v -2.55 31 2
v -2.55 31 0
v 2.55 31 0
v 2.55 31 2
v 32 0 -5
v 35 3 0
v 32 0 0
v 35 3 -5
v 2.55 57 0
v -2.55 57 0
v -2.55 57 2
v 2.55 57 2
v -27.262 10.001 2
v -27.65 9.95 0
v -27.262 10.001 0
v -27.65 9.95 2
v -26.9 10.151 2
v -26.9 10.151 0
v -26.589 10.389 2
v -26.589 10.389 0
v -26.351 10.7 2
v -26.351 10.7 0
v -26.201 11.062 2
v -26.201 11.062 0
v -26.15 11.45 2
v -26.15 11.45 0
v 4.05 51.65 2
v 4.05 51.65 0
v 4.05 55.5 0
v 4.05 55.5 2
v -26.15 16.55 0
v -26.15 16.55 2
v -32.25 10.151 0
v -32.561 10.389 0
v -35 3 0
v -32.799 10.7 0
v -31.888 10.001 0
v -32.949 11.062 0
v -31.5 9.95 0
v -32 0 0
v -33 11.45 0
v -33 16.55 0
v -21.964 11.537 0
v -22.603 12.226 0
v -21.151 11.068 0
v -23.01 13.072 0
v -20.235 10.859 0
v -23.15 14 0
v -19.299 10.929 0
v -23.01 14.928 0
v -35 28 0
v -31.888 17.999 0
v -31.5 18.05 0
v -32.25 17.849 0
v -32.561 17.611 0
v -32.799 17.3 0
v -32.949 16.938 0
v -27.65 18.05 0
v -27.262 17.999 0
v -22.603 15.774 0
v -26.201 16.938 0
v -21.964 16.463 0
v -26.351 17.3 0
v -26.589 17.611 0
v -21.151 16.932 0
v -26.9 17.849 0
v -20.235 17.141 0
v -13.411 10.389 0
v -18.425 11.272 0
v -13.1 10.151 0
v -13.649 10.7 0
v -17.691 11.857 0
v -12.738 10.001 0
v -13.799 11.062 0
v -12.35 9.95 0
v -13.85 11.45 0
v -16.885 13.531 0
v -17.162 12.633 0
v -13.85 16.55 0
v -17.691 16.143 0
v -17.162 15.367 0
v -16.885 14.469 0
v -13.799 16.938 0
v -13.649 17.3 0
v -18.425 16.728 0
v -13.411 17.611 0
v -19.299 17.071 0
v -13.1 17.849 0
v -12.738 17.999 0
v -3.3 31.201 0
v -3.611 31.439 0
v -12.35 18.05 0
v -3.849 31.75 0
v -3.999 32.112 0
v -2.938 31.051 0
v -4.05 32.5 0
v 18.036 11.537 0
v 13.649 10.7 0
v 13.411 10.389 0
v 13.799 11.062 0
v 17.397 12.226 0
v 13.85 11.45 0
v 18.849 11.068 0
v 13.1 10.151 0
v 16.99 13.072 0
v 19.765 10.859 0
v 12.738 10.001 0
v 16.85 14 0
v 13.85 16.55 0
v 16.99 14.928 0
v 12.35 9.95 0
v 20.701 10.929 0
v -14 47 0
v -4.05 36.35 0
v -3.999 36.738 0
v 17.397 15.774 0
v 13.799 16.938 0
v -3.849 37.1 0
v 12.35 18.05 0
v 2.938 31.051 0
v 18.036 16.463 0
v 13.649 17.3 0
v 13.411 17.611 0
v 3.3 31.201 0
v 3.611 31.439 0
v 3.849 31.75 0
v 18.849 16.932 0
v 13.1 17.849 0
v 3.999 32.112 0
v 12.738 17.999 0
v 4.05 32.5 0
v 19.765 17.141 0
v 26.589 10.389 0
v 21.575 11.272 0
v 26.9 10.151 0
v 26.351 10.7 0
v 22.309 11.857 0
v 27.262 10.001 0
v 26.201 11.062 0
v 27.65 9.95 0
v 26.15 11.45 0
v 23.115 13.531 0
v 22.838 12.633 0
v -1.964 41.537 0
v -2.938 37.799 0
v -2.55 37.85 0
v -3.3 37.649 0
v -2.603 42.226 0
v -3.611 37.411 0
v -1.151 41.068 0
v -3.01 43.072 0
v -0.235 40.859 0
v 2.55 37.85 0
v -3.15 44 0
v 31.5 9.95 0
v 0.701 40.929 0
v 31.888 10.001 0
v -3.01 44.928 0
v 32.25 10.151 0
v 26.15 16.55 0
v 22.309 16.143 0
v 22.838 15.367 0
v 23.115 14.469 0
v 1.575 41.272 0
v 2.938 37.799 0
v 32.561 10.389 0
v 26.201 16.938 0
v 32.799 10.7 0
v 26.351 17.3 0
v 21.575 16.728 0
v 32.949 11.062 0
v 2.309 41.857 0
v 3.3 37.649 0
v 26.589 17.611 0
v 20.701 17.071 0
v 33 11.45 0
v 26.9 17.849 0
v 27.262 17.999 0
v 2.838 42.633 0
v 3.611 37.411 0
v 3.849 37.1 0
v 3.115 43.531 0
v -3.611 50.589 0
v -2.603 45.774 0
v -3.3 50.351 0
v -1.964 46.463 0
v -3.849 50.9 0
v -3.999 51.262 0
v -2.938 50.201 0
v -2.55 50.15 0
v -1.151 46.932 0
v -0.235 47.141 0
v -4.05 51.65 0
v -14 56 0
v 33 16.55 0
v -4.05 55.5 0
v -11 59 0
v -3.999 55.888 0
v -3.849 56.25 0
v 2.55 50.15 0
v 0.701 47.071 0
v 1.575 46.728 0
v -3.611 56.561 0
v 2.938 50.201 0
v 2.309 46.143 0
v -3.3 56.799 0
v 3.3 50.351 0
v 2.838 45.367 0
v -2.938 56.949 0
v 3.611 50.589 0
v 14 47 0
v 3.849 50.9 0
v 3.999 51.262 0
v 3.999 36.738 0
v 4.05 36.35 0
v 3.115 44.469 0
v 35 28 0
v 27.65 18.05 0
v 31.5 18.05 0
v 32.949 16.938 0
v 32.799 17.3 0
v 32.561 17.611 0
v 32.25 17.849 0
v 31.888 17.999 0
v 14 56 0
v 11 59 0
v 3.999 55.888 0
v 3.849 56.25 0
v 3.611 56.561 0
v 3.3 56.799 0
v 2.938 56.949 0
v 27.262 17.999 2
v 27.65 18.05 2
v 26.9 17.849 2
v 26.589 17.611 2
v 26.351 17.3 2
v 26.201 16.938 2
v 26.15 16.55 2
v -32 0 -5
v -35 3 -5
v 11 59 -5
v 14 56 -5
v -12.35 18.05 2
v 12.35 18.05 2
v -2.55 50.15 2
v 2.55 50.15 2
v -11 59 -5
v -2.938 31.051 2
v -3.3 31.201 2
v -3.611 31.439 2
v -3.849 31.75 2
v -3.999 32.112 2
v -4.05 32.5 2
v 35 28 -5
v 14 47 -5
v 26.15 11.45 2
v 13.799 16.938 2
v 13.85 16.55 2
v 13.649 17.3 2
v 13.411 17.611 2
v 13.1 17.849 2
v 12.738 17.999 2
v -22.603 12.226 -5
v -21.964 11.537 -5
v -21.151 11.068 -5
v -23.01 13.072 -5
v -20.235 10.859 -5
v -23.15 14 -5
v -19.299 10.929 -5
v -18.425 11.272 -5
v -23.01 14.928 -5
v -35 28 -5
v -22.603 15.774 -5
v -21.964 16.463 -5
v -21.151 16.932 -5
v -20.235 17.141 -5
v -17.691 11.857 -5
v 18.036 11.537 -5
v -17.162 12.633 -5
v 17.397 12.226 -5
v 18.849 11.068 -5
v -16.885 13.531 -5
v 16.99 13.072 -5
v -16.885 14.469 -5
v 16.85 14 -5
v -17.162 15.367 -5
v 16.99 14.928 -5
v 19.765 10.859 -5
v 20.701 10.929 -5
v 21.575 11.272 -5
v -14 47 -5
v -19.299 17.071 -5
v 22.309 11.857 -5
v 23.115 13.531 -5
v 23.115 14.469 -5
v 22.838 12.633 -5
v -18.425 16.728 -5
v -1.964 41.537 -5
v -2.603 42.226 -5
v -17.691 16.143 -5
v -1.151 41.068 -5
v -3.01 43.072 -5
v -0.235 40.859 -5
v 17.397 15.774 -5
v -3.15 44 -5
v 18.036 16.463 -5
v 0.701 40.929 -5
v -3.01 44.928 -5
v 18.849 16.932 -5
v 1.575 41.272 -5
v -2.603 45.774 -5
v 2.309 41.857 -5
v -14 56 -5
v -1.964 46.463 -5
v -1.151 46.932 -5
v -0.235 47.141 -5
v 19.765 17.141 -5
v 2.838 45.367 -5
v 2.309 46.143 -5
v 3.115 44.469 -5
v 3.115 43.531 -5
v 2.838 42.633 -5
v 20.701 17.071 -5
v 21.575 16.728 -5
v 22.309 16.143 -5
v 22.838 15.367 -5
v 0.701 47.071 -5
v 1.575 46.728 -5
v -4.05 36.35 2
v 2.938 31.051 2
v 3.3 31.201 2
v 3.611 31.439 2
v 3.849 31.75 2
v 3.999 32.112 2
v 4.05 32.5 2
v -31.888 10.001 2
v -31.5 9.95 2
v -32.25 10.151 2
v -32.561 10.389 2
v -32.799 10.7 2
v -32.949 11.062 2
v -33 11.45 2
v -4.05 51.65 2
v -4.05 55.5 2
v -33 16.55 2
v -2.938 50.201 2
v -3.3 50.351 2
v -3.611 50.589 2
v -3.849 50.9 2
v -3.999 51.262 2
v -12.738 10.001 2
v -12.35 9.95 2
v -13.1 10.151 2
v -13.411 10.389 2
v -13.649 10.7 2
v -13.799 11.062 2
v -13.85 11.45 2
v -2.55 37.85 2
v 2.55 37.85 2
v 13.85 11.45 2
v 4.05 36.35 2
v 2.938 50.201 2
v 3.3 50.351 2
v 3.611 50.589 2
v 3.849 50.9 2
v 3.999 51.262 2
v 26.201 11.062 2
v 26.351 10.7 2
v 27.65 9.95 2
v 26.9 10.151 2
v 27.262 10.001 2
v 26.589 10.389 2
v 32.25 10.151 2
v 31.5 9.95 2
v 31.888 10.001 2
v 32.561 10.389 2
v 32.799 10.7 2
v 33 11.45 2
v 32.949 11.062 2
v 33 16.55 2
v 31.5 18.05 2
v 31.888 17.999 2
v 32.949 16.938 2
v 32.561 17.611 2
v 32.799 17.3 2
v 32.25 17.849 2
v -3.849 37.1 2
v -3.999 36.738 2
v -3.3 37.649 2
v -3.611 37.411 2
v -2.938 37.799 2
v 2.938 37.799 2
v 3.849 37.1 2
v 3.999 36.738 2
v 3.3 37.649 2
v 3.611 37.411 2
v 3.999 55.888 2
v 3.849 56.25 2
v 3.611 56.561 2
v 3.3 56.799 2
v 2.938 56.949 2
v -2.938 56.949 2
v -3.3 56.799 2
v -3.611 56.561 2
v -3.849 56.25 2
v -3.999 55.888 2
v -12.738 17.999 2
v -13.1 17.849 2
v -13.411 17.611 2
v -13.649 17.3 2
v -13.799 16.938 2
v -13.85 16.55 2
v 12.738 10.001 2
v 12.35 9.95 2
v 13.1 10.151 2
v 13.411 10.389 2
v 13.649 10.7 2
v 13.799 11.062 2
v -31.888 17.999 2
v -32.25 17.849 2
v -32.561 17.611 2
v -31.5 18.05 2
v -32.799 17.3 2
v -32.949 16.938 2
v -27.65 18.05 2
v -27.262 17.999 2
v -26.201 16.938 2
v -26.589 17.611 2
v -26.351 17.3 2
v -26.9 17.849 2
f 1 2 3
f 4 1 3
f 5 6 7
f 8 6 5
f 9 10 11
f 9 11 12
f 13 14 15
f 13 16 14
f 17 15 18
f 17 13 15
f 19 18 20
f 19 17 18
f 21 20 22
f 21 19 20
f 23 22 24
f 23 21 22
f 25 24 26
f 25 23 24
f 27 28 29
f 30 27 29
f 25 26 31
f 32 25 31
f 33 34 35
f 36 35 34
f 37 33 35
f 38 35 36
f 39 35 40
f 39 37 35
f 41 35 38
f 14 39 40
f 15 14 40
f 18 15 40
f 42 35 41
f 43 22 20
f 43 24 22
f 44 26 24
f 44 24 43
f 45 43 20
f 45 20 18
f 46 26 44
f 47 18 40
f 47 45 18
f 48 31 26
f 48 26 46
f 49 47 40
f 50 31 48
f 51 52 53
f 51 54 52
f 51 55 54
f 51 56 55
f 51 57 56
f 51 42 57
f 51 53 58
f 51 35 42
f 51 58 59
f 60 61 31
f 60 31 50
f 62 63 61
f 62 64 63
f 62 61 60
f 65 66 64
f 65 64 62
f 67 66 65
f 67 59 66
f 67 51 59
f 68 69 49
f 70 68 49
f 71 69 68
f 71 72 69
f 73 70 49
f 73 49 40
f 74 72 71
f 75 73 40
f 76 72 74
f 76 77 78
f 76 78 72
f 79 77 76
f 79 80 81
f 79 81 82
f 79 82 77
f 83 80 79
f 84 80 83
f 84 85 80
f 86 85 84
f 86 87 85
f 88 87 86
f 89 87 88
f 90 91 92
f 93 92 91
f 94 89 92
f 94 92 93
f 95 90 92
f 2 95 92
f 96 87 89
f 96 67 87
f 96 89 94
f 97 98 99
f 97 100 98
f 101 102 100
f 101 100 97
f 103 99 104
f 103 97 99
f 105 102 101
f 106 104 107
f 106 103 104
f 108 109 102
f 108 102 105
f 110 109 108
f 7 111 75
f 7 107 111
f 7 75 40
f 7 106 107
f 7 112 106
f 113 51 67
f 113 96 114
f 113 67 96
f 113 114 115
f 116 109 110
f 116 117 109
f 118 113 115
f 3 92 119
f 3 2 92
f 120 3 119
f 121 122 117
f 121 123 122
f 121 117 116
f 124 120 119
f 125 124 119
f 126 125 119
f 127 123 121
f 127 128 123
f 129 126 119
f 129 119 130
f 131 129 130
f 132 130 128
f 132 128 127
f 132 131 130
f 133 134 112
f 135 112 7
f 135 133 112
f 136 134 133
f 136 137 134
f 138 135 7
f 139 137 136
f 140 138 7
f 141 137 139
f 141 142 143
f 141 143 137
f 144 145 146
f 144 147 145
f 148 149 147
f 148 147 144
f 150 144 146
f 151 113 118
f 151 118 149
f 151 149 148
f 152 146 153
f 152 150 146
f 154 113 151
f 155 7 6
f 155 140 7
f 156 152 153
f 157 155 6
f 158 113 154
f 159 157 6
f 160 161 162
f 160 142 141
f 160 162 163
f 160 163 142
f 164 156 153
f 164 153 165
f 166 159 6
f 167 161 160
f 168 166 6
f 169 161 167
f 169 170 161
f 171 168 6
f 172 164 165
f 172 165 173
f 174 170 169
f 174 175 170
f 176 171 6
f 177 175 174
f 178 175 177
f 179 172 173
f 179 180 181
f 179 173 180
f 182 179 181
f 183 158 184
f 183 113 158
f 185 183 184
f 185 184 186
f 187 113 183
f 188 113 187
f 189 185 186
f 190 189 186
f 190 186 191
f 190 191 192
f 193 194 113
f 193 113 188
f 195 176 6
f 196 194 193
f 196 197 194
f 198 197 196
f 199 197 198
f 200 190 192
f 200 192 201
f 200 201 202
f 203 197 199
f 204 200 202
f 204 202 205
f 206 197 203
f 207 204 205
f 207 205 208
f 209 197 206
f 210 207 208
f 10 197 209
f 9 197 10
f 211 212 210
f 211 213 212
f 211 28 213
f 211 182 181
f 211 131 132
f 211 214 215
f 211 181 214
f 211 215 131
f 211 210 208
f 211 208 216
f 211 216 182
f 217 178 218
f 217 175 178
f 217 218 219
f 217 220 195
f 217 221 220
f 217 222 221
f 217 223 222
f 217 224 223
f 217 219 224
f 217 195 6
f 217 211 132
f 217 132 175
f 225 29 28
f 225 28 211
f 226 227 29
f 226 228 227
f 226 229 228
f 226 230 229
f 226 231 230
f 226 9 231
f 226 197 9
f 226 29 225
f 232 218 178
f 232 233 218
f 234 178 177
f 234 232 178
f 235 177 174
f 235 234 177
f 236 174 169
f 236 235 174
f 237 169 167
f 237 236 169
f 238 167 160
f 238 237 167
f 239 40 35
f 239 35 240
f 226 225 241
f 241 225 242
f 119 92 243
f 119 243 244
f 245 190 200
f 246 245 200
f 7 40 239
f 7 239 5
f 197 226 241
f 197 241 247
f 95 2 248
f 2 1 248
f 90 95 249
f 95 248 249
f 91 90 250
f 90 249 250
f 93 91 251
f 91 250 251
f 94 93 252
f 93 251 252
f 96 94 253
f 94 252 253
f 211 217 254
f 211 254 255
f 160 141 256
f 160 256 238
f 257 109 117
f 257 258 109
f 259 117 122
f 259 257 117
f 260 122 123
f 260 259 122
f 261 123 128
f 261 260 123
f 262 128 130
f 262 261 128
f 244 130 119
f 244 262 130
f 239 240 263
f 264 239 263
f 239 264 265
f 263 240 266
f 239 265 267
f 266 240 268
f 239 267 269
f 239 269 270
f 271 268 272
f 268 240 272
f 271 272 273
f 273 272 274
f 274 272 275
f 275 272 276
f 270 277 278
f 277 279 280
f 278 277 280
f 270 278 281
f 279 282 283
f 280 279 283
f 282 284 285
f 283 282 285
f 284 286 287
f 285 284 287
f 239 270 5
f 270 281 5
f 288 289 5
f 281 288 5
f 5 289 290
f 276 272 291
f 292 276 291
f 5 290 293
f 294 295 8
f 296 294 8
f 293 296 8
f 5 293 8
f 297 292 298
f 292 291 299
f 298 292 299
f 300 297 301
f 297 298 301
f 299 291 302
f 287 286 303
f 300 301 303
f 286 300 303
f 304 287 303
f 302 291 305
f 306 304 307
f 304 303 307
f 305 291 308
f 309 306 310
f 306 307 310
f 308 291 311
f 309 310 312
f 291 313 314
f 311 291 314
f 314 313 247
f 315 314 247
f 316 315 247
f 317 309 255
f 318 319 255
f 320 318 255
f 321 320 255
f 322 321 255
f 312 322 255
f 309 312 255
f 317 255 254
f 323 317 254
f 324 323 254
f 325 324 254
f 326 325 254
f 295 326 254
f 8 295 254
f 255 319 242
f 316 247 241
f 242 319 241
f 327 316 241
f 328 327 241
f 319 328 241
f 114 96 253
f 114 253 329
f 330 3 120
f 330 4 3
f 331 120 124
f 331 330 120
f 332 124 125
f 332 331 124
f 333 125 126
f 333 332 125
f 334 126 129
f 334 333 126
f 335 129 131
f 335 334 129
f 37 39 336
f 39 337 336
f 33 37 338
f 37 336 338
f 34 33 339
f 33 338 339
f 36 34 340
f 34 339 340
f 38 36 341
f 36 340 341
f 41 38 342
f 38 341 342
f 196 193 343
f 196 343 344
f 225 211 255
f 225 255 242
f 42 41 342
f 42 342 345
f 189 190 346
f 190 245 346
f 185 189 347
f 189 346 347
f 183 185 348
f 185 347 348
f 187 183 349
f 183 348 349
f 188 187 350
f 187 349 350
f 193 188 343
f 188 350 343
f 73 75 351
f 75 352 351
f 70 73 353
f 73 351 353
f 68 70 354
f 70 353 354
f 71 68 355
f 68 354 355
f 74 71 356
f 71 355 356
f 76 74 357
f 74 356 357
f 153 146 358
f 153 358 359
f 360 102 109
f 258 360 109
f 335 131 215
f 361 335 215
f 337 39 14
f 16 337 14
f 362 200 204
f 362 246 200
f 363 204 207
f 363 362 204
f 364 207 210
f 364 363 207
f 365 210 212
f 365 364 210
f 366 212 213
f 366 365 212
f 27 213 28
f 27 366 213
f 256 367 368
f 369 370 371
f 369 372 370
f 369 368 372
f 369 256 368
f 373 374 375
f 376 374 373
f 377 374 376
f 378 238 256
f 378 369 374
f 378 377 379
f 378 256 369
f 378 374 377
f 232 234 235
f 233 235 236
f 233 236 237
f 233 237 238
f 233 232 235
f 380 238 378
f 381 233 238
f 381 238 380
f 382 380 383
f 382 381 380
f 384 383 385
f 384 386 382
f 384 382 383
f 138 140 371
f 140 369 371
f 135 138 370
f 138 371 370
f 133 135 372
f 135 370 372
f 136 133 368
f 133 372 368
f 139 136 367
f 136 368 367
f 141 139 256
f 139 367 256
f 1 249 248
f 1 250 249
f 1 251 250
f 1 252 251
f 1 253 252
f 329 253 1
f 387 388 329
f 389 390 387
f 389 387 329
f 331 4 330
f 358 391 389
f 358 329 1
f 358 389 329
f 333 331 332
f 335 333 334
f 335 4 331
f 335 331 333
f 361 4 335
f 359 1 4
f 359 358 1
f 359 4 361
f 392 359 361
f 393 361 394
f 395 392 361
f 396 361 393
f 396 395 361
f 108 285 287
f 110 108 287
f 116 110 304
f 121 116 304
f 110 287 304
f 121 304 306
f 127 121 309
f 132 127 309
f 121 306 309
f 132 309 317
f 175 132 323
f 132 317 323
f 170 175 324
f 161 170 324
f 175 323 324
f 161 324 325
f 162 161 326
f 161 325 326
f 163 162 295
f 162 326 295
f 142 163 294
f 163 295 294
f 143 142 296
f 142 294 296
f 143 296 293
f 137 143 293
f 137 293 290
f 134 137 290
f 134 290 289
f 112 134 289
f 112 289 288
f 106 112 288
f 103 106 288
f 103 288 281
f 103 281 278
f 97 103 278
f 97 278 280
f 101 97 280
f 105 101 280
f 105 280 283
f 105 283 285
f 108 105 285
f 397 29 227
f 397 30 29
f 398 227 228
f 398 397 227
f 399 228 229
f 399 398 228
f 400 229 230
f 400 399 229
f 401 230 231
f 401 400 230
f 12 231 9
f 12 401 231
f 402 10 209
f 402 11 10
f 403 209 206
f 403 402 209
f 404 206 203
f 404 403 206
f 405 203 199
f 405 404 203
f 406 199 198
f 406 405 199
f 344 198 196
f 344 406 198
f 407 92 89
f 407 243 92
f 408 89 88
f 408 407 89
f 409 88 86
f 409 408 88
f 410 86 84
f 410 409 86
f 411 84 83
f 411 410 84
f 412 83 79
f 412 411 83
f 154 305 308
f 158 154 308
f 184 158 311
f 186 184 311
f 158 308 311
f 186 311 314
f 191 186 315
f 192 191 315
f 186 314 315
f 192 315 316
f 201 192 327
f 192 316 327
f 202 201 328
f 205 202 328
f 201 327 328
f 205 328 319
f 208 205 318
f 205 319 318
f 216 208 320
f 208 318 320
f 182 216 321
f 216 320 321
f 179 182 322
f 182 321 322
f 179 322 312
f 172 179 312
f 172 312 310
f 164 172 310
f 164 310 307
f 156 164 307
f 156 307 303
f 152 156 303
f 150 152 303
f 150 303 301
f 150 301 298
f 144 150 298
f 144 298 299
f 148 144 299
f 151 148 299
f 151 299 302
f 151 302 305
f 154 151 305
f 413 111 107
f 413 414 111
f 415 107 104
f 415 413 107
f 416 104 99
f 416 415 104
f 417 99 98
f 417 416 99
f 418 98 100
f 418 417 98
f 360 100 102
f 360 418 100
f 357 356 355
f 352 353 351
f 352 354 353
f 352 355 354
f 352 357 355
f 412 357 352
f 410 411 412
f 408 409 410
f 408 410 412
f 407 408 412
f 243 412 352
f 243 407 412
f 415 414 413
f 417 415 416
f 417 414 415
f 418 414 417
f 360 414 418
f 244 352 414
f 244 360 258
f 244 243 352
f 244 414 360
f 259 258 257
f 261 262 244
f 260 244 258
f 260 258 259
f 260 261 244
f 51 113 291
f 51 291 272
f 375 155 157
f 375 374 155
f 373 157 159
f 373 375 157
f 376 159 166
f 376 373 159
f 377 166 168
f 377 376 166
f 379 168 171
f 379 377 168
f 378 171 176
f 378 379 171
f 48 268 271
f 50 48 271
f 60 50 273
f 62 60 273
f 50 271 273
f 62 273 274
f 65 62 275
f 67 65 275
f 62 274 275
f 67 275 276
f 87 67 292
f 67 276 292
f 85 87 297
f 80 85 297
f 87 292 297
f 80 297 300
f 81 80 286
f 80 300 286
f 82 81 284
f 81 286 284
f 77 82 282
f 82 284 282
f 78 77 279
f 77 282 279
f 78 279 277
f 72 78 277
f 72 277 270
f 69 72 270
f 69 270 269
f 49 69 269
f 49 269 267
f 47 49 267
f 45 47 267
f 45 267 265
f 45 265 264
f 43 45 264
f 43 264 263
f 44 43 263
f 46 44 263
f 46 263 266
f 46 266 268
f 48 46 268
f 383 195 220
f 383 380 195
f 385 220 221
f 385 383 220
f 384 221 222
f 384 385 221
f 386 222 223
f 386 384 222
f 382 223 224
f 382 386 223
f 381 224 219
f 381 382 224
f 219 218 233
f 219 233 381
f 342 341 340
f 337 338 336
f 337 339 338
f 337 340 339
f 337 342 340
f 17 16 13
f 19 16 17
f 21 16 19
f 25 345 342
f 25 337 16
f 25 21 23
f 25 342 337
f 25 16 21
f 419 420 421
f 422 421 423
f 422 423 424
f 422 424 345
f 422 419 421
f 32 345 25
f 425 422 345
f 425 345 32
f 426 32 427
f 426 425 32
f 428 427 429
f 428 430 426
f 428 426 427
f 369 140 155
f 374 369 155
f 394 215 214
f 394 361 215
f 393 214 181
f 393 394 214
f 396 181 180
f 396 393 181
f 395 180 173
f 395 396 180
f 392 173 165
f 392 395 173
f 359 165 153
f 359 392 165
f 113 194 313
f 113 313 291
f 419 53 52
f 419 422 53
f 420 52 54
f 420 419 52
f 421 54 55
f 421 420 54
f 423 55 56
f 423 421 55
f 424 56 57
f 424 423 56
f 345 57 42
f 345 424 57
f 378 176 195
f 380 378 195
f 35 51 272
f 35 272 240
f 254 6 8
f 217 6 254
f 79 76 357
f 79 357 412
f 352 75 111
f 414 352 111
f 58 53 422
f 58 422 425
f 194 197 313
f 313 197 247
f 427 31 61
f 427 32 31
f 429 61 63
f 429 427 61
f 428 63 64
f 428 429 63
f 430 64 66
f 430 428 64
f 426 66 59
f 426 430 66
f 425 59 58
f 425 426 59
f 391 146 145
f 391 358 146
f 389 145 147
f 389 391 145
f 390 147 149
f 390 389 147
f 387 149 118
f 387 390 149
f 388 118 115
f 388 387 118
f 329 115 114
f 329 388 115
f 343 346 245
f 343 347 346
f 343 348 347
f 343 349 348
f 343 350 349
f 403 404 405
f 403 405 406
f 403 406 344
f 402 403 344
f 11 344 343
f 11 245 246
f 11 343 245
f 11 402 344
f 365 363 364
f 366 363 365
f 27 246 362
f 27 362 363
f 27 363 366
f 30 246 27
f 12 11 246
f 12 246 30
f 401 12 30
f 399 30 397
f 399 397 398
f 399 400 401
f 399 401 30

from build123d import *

# Parameters (mm, degrees)
F1_DEPTH = 5
F2_D     = 6.3
F3_SIZE  = 3
F4_W     = 8.1
F4_H     = 6.85
F4_W_2   = 6.85
F4_H_2   = 8.1
F4_W_3   = 27.7
F5_DEPTH = 2
F6_R     = 1.5


with BuildPart() as f1:
    # F0 (on Top) → F1 (new body)
    with BuildSketch(Plane.XY):
        Polygon((-35, 28), (-35, 0), (35, 0), (35, 28), (14, 47), (14, 59), (-14, 59), (-14, 47), align=None)
    extrude(amount=-F1_DEPTH)

    # F2 (through all)
    with Locations(Plane.XY):
        with Locations((20, 14), (-20, 14), (0, 44)):
            Hole(F2_D / 2)

    # F3
    f3_edges = [f1.edges().sort_by_distance(p)[0] for p in [
        (14, 59, -2.5),
        (-14, 59, -2.5),
        (35, 0, -2.5),
        (-35, 0, -2.5),
    ]]
    chamfer(f3_edges, length=F3_SIZE)

    # F4 (on face) → F5 (join)
    with BuildSketch(Plane.XY):
        with Locations((0, 53.575)):
            Rectangle(F4_W, F4_H)
        with Locations((0, 34.425)):
            Rectangle(F4_W, F4_H)
        with Locations((29.575, 14)):
            Rectangle(F4_W_2, F4_H_2)
        with Locations((0, 14)):
            Rectangle(F4_W_3, F4_H_2)
        with Locations((-29.575, 14)):
            Rectangle(F4_W_2, F4_H_2)
    extrude(amount=F5_DEPTH)

    # F6
    f6_edges = [f1.edges().sort_by_distance(p)[0] for p in [
        (-26.15, 9.95, 1),
        (-33, 9.95, 1),
        (-33, 18.05, 1),
        (-26.15, 18.05, 1),
        (-13.85, 9.95, 1),
        (-13.85, 18.05, 1),
        (13.85, 9.95, 1),
        (13.85, 18.05, 1),
        (33, 18.05, 1),
        (33, 9.95, 1),
        (26.15, 9.95, 1),
        (26.15, 18.05, 1),
        (4.05, 31, 1),
        (-4.05, 31, 1),
        (4.05, 37.85, 1),
        (-4.05, 37.85, 1),
        (4.05, 57, 1),
        (4.05, 50.15, 1),
        (-4.05, 57, 1),
        (-4.05, 50.15, 1),
    ]]
    fillet(f6_edges, radius=F6_R)


solid = f1.part
